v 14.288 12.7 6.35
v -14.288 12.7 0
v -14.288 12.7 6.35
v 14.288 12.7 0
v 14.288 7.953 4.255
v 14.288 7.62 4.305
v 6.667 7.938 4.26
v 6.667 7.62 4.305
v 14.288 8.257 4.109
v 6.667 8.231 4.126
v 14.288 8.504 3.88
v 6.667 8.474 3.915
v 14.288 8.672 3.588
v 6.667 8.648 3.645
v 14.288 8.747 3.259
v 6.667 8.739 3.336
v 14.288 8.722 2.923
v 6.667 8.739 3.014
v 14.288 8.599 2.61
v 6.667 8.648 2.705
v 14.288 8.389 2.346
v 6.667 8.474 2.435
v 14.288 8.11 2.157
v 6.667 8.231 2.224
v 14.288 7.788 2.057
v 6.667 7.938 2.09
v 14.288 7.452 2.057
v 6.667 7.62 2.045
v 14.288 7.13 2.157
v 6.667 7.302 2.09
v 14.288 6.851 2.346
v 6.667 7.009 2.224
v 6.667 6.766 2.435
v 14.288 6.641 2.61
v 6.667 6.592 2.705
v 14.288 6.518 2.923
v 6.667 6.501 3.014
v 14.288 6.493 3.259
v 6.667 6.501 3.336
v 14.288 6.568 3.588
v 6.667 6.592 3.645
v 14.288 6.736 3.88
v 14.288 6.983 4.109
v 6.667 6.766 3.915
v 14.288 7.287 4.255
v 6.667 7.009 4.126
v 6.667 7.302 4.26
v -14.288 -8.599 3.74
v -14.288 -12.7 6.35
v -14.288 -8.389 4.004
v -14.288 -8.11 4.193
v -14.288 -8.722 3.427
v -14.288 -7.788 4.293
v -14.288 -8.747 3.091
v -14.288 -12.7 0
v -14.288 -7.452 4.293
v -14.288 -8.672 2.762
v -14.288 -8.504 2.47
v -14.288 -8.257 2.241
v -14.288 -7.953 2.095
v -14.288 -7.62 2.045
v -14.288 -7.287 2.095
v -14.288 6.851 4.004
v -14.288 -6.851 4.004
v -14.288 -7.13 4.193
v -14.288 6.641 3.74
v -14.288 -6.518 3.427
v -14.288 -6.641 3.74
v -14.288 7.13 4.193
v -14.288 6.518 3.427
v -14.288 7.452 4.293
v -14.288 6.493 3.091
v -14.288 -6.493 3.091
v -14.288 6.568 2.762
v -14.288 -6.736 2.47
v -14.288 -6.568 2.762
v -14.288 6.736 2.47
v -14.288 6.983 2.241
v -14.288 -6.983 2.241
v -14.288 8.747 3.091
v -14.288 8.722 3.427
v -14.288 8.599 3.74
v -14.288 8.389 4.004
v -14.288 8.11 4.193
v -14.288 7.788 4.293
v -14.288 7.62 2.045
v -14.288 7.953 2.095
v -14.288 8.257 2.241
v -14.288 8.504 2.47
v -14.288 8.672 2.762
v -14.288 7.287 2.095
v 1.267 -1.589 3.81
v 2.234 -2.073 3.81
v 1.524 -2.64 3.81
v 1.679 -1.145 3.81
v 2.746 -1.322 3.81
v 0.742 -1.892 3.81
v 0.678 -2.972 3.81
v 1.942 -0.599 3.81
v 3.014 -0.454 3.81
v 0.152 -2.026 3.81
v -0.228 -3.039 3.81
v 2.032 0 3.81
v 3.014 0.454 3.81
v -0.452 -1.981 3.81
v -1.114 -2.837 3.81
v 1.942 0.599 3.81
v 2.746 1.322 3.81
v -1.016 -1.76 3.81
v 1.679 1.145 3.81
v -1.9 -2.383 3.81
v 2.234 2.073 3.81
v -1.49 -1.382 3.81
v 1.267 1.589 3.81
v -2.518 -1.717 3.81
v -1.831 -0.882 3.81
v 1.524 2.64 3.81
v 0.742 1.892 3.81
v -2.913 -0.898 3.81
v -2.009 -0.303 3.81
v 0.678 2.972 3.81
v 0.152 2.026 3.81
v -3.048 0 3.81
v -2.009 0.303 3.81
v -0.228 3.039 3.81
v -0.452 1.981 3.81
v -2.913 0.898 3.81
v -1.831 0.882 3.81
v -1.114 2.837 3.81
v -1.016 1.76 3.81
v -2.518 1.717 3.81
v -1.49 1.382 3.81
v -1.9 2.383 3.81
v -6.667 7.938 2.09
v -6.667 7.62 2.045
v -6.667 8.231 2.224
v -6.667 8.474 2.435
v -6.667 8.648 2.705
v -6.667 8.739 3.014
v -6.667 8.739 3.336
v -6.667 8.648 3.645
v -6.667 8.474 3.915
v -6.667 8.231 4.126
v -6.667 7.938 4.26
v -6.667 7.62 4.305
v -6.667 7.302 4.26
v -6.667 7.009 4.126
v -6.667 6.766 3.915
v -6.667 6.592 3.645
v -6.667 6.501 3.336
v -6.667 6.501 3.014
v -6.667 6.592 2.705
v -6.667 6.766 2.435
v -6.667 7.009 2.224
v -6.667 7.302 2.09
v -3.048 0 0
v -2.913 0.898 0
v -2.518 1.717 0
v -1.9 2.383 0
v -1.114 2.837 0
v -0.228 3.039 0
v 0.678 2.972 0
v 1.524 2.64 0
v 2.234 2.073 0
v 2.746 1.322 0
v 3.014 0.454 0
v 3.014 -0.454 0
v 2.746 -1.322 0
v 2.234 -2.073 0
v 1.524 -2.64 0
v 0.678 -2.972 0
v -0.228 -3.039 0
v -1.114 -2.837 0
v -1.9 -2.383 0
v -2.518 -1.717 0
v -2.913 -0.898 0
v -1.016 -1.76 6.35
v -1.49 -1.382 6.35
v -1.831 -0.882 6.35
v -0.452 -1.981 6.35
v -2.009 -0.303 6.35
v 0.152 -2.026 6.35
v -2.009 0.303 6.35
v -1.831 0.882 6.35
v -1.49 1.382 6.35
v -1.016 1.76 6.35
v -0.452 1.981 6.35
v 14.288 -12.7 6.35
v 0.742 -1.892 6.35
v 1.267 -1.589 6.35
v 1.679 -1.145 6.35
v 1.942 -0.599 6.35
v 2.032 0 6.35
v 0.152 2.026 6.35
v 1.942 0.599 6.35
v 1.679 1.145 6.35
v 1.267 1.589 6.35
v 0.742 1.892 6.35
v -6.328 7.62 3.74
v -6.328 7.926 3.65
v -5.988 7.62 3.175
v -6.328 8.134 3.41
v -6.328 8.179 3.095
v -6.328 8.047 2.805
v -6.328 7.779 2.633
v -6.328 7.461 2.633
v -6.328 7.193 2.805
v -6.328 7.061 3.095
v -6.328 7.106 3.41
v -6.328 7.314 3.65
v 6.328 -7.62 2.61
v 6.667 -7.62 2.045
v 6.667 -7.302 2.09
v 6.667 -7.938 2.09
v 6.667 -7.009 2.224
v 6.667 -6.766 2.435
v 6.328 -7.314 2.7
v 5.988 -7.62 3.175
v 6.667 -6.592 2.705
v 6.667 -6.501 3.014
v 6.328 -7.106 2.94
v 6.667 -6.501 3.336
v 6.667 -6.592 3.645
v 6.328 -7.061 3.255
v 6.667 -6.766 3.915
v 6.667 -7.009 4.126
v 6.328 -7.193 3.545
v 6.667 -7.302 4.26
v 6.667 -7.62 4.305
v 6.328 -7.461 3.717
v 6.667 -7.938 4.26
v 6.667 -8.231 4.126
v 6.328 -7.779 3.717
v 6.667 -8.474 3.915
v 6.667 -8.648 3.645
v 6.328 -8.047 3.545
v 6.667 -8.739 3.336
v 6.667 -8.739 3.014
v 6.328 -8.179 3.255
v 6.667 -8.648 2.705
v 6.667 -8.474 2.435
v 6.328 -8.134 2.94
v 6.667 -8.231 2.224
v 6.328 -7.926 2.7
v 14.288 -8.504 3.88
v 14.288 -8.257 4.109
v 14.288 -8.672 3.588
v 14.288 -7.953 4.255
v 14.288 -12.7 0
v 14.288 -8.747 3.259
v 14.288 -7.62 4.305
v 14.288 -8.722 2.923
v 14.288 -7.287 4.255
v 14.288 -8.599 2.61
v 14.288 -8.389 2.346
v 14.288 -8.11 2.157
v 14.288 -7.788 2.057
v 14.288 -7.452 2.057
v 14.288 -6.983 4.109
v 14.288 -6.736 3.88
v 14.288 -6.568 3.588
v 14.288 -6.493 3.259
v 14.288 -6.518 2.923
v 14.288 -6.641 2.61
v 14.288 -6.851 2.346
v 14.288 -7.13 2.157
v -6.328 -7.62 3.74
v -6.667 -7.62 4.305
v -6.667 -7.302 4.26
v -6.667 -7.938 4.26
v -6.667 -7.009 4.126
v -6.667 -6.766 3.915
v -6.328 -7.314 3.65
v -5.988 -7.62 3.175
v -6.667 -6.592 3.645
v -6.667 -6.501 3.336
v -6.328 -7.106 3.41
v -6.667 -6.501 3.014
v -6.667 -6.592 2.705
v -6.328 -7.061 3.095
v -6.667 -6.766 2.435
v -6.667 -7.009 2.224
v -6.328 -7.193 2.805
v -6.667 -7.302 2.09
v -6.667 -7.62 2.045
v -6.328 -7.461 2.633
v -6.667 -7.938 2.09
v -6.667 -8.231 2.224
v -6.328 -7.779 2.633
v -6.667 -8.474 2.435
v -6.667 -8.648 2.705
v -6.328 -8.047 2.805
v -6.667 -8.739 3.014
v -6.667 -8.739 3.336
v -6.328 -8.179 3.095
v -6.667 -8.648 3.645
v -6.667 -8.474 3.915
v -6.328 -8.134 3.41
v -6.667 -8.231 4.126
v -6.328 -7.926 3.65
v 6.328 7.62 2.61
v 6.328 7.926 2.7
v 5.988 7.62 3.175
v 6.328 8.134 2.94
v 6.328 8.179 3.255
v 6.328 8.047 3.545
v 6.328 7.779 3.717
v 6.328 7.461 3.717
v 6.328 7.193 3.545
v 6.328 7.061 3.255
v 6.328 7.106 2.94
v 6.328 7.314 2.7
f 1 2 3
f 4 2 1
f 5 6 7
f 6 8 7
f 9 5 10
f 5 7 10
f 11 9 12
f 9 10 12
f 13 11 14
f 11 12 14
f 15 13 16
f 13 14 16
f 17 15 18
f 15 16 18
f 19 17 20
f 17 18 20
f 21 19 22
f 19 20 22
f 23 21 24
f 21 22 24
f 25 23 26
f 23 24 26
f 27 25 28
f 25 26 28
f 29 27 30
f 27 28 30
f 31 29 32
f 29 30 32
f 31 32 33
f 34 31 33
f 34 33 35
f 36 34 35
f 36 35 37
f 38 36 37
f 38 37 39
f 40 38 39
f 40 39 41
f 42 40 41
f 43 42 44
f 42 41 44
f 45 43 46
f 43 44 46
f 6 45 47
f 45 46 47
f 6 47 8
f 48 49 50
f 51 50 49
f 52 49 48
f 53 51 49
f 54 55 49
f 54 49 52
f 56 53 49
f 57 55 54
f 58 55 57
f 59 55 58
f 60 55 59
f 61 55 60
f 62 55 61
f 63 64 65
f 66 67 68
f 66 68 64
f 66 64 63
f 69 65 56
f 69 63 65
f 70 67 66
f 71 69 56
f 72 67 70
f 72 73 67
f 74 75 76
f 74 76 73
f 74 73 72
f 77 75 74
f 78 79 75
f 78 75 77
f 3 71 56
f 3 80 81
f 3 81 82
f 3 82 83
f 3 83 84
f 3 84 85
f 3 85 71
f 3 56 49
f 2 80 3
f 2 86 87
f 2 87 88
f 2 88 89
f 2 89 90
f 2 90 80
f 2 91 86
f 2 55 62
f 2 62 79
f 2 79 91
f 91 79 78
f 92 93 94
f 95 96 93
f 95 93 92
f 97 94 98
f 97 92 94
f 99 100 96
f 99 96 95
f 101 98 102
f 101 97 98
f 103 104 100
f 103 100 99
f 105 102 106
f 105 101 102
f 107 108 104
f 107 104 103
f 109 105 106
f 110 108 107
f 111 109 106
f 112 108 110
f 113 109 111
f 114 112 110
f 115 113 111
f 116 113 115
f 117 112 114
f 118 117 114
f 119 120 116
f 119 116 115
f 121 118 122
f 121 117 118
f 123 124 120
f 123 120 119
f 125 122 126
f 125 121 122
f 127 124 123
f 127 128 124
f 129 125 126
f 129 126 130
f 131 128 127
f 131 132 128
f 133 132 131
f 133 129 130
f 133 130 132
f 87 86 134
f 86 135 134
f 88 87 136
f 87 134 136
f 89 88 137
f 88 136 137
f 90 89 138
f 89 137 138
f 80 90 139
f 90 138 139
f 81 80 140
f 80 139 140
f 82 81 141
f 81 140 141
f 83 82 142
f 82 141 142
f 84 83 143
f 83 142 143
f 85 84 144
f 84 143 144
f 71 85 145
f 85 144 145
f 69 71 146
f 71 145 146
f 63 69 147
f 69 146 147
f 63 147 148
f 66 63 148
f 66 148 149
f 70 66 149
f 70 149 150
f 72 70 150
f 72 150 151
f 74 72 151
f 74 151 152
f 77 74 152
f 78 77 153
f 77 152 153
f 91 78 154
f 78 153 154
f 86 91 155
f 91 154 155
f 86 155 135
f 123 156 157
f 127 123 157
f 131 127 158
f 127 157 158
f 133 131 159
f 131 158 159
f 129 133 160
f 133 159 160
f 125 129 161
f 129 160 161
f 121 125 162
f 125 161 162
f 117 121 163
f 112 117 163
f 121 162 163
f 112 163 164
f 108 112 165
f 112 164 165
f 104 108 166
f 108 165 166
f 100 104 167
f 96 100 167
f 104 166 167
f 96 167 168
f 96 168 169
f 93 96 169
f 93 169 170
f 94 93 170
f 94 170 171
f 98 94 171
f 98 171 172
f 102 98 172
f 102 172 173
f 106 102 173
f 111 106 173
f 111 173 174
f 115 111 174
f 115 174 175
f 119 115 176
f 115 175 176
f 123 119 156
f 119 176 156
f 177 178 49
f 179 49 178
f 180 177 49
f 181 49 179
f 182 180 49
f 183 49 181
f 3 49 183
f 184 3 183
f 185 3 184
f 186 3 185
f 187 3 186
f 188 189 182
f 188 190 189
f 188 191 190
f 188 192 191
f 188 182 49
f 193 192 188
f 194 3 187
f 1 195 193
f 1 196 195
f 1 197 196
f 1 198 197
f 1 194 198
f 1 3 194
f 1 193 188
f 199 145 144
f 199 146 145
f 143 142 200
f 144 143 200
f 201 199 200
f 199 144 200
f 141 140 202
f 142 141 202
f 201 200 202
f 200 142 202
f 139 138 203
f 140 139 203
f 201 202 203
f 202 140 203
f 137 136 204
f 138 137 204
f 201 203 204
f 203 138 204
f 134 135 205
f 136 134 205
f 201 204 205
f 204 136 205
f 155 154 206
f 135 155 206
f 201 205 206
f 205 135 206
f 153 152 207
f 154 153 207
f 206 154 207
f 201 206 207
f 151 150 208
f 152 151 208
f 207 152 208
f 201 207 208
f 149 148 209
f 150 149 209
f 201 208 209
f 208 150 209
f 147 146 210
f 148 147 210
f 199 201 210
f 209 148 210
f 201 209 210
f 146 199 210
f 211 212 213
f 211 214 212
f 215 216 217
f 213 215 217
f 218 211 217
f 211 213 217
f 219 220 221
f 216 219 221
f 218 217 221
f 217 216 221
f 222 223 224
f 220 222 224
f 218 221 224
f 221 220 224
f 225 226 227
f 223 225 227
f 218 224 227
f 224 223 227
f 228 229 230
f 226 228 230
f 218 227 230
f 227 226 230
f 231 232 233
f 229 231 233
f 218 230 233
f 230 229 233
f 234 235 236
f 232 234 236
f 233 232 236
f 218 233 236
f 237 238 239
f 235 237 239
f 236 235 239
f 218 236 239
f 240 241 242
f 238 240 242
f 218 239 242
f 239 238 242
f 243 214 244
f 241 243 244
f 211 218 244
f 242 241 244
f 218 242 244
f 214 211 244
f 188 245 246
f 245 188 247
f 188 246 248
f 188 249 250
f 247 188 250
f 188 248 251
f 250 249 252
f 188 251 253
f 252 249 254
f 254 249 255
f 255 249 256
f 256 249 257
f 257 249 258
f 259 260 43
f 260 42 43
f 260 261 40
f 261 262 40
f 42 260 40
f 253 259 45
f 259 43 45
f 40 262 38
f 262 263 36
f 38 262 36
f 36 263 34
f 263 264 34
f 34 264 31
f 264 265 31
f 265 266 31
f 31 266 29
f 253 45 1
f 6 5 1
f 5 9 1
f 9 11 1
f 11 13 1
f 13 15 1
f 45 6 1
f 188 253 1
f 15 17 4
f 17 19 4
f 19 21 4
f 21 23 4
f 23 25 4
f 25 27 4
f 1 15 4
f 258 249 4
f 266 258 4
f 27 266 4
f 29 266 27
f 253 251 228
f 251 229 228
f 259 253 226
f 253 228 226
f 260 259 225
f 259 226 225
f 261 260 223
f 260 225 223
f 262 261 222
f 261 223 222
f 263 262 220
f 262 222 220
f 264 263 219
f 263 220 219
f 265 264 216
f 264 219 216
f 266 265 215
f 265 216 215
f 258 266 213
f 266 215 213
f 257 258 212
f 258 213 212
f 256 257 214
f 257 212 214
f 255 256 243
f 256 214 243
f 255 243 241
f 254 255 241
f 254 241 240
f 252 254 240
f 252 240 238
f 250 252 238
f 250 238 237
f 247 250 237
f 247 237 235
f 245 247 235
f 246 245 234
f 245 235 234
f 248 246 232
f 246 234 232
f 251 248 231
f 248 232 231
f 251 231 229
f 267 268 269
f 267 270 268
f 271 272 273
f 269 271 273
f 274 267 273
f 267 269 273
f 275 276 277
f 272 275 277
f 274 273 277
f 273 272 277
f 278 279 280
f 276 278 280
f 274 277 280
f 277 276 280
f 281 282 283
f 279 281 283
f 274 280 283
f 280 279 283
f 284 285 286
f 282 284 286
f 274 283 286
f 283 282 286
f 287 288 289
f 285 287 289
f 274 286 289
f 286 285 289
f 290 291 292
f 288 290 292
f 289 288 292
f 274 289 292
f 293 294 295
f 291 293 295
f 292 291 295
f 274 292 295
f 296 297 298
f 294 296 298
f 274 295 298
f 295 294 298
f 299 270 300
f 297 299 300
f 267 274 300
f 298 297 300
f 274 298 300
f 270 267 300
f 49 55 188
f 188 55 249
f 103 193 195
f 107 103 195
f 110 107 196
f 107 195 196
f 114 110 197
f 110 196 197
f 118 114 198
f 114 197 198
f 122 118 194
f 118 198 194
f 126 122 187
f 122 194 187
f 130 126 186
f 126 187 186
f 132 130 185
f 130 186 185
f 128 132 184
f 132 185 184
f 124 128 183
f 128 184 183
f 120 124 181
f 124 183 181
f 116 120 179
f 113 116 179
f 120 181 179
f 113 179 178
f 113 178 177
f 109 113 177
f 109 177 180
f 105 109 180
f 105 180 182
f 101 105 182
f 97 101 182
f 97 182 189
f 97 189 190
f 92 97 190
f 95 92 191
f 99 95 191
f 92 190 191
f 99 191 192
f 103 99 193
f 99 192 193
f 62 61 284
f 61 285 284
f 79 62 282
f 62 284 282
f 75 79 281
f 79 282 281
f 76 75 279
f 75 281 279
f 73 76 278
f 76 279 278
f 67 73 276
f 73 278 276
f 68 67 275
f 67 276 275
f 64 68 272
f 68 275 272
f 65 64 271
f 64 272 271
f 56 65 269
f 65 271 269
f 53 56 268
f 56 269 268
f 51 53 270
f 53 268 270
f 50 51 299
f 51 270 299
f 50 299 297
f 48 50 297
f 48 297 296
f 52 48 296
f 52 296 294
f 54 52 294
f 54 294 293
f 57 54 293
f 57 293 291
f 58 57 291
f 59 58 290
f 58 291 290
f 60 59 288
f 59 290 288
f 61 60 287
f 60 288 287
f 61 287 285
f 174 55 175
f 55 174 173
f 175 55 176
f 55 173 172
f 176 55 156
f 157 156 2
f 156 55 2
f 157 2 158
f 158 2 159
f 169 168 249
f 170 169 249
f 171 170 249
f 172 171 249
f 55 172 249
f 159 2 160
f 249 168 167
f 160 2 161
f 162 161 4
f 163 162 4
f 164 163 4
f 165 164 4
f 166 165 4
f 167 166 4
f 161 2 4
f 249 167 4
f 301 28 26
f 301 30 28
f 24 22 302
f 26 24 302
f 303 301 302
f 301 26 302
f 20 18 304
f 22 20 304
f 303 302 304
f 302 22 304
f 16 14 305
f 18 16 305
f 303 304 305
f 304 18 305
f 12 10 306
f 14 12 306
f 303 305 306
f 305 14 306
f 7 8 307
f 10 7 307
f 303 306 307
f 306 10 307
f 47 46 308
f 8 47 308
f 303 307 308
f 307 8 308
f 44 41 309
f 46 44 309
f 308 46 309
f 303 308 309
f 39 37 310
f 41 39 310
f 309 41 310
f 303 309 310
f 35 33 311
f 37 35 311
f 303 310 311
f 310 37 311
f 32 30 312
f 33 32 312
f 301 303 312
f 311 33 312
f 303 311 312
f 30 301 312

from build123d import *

# Parameters (mm, degrees)
SKETCH2_W                 = 28.575
SKETCH2_H                 = 25.4
BOSS_EXTRUDE1_DEPTH       = 6.35
F_4_40_TAPPED_HOLE2_D     = 2.2606
F_4_40_TAPPED_HOLE2_DEPTH = 7.62
F_4_40_TAPPED_HOLE2_TIP   = 0.679152758
F_4_40_TAPPED_HOLE1_D     = 2.2606
F_4_40_TAPPED_HOLE1_DEPTH = 7.62
F_4_40_TAPPED_HOLE1_TIP   = 0.679152758
SKETCH7_R                 = 2.032
CUT_EXTRUDE1_DEPTH        = 2.54
SKETCH12_R                = 3.048
CUT_EXTRUDE2_DEPTH        = 3.81


with BuildPart() as part:
    # Sketch2 → Boss-Extrude1 (new body)
    with BuildSketch(Plane.XY):
        Rectangle(SKETCH2_W, SKETCH2_H)
    extrude(amount=BOSS_EXTRUDE1_DEPTH)

    # #4-40 Tapped Hole2
    with Locations(Plane(origin=(14.2875, 0, 0), x_dir=(0, 0, -1), z_dir=(1, 0, 0))):
        with Locations((-3.175, 7.62), (-3.175, -7.62)):
            Hole(F_4_40_TAPPED_HOLE2_D / 2, depth=F_4_40_TAPPED_HOLE2_DEPTH)
            with Locations((0, 0, -(F_4_40_TAPPED_HOLE2_DEPTH + F_4_40_TAPPED_HOLE2_TIP / 2))):  # 118° drill point
                Cone(0, F_4_40_TAPPED_HOLE2_D / 2, F_4_40_TAPPED_HOLE2_TIP, mode=Mode.SUBTRACT)

    # #4-40 Tapped Hole1
    with Locations(Plane.ZY.offset(14.2875)):
        with Locations((3.175, 7.62), (3.175, -7.62)):
            Hole(F_4_40_TAPPED_HOLE1_D / 2, depth=F_4_40_TAPPED_HOLE1_DEPTH)
            with Locations((0, 0, -(F_4_40_TAPPED_HOLE1_DEPTH + F_4_40_TAPPED_HOLE1_TIP / 2))):  # 118° drill point
                Cone(0, F_4_40_TAPPED_HOLE1_D / 2, F_4_40_TAPPED_HOLE1_TIP, mode=Mode.SUBTRACT)

    # Sketch7 → Cut-Extrude1 (cut)
    with BuildSketch(Plane.XY.offset(6.35)):
        Circle(SKETCH7_R)
    extrude(amount=-CUT_EXTRUDE1_DEPTH, mode=Mode.SUBTRACT)

    # Sketch12 → Cut-Extrude2 (cut)
    with BuildSketch(Plane(origin=(0, 0, 0), x_dir=(-1, 0, 0), z_dir=(0, 0, -1))):
        Circle(SKETCH12_R)
    extrude(amount=-CUT_EXTRUDE2_DEPTH, mode=Mode.SUBTRACT)


solid = part.part
